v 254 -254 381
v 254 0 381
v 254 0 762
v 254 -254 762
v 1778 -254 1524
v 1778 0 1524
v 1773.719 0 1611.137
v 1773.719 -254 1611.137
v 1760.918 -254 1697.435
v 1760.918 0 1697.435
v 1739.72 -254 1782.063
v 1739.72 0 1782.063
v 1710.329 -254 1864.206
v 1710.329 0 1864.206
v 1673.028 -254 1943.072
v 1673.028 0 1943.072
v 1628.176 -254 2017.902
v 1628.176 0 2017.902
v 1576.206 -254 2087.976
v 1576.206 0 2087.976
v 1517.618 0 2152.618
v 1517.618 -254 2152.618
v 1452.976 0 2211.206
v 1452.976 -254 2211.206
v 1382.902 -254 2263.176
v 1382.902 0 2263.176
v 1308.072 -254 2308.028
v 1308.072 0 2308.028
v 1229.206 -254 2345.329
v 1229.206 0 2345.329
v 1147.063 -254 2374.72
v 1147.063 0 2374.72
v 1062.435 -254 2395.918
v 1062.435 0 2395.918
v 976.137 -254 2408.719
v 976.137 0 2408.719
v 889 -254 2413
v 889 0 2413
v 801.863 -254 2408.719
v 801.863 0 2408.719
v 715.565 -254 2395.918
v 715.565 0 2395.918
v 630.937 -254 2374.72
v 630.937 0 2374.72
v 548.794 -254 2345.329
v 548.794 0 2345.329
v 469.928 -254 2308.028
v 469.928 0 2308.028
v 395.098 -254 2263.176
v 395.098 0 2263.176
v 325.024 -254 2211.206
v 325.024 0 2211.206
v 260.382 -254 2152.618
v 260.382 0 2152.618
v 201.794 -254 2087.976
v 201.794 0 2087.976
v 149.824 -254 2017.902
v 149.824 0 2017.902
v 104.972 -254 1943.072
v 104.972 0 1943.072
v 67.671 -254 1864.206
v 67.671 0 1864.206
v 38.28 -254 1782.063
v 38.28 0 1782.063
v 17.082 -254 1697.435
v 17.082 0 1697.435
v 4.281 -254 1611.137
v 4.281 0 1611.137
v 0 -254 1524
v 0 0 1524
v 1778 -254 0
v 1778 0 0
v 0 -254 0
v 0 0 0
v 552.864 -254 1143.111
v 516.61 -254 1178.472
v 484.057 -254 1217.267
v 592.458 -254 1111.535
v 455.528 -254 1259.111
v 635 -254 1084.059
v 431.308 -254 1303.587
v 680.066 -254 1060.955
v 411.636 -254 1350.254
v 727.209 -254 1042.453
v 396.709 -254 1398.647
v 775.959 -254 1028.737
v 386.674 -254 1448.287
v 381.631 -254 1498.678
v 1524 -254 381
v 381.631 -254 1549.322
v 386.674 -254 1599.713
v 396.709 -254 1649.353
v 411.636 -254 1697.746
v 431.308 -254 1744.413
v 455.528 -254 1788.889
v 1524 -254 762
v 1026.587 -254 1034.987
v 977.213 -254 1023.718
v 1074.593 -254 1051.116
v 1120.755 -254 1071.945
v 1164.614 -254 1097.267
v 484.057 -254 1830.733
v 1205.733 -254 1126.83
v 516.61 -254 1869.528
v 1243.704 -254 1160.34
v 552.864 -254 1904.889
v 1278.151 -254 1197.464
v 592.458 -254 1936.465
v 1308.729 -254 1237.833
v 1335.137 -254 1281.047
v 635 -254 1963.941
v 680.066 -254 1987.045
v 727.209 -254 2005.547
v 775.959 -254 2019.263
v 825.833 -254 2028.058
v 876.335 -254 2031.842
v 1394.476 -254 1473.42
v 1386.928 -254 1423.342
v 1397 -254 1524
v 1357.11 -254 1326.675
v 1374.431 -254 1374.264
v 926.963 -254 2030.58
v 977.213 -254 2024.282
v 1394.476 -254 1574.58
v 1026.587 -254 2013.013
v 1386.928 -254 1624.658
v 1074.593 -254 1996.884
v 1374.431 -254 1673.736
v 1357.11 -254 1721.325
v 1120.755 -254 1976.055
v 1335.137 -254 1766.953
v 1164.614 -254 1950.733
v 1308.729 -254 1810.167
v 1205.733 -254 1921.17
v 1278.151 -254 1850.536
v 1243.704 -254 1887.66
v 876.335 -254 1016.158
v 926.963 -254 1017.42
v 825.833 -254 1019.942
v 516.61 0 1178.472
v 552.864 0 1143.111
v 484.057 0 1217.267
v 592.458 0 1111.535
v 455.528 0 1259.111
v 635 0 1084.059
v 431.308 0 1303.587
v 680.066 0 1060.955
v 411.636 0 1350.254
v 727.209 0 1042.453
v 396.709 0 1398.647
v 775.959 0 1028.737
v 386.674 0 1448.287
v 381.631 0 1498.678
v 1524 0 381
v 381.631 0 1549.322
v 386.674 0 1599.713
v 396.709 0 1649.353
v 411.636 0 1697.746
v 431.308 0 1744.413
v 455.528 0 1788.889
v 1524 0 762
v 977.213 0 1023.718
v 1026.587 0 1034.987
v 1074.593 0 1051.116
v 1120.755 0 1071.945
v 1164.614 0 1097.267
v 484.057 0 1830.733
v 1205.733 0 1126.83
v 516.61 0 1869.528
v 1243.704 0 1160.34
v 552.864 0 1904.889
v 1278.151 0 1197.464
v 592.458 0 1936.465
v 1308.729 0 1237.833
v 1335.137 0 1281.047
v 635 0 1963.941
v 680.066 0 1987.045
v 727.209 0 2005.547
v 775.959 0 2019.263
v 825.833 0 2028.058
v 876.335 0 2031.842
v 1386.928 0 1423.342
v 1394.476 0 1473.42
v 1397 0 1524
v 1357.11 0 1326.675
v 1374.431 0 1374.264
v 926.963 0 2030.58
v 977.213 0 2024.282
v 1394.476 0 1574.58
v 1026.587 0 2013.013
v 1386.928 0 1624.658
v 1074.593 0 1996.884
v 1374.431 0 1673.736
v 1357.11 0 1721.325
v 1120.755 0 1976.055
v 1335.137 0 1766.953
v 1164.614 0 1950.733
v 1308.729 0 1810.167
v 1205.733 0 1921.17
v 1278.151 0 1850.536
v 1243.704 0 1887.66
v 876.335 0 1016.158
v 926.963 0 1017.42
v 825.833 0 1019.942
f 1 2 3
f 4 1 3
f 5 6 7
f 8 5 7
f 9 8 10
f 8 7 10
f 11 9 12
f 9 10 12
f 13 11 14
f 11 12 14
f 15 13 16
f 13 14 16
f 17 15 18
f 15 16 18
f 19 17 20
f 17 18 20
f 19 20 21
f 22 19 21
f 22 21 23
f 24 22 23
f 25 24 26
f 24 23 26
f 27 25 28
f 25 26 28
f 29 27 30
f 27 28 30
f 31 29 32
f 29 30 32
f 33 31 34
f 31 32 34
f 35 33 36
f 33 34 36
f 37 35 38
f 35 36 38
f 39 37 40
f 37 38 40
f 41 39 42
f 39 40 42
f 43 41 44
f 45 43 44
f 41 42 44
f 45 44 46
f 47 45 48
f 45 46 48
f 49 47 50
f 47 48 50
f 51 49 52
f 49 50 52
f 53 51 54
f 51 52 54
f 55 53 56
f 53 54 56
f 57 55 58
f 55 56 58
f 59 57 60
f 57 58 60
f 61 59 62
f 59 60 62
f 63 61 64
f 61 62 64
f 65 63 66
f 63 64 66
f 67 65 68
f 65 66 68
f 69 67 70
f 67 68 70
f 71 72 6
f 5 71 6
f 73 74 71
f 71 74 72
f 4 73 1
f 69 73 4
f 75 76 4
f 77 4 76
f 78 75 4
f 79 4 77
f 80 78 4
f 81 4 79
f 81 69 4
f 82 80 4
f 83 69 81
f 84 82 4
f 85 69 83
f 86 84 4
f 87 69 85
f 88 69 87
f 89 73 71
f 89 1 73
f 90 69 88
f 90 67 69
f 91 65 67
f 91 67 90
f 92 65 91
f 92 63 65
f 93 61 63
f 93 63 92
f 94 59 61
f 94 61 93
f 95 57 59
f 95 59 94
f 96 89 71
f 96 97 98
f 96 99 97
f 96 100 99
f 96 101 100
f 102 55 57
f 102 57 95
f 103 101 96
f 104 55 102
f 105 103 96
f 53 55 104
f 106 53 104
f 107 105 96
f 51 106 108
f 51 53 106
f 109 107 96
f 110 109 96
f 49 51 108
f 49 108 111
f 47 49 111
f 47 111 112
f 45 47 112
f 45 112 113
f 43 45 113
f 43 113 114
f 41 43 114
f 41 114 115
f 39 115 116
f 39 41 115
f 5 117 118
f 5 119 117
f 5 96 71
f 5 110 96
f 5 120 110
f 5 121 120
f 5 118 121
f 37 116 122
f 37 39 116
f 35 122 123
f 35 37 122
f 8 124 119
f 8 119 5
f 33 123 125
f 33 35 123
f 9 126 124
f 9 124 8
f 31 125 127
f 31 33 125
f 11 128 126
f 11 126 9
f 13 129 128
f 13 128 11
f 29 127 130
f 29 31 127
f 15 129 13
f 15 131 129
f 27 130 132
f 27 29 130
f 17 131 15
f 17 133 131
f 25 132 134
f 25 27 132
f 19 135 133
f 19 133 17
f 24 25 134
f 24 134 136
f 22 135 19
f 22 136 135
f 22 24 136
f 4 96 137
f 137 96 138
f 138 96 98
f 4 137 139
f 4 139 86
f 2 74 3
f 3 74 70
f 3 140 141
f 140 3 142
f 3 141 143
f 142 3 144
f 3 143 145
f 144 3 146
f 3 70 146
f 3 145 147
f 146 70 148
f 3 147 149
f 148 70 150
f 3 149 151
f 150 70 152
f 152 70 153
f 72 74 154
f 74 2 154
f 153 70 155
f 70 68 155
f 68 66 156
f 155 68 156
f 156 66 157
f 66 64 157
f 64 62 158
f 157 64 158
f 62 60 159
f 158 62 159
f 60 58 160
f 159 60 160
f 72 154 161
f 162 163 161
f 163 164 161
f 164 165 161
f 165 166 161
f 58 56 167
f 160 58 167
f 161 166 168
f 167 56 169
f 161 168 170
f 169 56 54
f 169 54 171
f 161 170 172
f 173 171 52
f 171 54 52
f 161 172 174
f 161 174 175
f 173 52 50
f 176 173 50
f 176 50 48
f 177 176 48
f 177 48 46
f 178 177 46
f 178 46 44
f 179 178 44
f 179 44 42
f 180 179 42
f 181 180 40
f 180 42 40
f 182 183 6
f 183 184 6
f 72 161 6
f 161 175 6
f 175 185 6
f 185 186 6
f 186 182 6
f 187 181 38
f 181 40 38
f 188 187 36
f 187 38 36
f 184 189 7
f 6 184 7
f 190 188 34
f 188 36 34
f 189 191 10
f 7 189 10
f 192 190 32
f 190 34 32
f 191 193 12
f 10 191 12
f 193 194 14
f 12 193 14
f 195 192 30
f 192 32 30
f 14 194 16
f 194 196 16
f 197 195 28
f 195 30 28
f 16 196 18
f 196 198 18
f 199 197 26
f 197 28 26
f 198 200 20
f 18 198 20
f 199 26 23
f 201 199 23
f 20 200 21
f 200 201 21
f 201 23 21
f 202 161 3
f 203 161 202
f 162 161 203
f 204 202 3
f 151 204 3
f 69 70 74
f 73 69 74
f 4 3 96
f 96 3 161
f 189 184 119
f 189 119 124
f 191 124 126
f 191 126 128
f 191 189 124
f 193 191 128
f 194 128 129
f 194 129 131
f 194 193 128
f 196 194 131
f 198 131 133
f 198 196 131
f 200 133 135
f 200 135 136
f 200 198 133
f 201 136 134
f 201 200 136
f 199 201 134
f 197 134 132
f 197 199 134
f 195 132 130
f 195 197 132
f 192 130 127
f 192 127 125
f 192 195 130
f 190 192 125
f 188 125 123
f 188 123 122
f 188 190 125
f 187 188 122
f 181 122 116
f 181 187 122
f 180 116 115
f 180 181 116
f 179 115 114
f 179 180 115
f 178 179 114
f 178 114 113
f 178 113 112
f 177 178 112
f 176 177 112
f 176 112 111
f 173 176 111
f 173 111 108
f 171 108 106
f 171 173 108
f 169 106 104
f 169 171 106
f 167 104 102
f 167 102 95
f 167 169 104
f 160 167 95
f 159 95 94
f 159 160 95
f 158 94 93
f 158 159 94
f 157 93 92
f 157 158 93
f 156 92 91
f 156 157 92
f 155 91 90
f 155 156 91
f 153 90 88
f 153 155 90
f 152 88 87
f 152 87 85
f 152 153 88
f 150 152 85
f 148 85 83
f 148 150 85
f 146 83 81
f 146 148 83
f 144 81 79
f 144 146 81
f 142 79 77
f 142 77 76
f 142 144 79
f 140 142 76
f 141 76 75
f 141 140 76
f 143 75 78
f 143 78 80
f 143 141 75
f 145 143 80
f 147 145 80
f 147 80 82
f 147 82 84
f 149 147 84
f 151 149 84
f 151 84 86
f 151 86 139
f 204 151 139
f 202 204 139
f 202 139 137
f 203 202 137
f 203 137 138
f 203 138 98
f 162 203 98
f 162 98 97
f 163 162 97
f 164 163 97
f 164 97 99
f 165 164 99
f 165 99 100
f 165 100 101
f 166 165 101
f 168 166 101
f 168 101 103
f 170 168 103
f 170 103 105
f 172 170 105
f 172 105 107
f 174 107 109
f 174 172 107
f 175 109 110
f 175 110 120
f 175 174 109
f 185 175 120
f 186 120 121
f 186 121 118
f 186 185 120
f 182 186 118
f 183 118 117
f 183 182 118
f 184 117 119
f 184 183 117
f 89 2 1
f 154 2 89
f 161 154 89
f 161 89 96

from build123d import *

# Parameters (mm, degrees)
F0_W     = 1270
F0_H     = 381
F0_R     = 508
F1_DEPTH = 254


with BuildPart() as f1:
    # F0 (on Front) → F1 (new body)
    with BuildSketch(Plane.XZ):
        with BuildLine():
            Line((0, 1524), (0, 0))
            Line((0, 0), (1778, 0))
            Line((1778, 0), (1778, 1524))
            ThreePointArc((1778, 1524), (889, 2413), (0, 1524))
        make_face()
        with Locations((889, 571.5)):
            Rectangle(F0_W, F0_H, mode=Mode.SUBTRACT)
        with Locations((889, 1524)):
            Circle(F0_R, mode=Mode.SUBTRACT)
    extrude(amount=F1_DEPTH)


solid = f1.part
